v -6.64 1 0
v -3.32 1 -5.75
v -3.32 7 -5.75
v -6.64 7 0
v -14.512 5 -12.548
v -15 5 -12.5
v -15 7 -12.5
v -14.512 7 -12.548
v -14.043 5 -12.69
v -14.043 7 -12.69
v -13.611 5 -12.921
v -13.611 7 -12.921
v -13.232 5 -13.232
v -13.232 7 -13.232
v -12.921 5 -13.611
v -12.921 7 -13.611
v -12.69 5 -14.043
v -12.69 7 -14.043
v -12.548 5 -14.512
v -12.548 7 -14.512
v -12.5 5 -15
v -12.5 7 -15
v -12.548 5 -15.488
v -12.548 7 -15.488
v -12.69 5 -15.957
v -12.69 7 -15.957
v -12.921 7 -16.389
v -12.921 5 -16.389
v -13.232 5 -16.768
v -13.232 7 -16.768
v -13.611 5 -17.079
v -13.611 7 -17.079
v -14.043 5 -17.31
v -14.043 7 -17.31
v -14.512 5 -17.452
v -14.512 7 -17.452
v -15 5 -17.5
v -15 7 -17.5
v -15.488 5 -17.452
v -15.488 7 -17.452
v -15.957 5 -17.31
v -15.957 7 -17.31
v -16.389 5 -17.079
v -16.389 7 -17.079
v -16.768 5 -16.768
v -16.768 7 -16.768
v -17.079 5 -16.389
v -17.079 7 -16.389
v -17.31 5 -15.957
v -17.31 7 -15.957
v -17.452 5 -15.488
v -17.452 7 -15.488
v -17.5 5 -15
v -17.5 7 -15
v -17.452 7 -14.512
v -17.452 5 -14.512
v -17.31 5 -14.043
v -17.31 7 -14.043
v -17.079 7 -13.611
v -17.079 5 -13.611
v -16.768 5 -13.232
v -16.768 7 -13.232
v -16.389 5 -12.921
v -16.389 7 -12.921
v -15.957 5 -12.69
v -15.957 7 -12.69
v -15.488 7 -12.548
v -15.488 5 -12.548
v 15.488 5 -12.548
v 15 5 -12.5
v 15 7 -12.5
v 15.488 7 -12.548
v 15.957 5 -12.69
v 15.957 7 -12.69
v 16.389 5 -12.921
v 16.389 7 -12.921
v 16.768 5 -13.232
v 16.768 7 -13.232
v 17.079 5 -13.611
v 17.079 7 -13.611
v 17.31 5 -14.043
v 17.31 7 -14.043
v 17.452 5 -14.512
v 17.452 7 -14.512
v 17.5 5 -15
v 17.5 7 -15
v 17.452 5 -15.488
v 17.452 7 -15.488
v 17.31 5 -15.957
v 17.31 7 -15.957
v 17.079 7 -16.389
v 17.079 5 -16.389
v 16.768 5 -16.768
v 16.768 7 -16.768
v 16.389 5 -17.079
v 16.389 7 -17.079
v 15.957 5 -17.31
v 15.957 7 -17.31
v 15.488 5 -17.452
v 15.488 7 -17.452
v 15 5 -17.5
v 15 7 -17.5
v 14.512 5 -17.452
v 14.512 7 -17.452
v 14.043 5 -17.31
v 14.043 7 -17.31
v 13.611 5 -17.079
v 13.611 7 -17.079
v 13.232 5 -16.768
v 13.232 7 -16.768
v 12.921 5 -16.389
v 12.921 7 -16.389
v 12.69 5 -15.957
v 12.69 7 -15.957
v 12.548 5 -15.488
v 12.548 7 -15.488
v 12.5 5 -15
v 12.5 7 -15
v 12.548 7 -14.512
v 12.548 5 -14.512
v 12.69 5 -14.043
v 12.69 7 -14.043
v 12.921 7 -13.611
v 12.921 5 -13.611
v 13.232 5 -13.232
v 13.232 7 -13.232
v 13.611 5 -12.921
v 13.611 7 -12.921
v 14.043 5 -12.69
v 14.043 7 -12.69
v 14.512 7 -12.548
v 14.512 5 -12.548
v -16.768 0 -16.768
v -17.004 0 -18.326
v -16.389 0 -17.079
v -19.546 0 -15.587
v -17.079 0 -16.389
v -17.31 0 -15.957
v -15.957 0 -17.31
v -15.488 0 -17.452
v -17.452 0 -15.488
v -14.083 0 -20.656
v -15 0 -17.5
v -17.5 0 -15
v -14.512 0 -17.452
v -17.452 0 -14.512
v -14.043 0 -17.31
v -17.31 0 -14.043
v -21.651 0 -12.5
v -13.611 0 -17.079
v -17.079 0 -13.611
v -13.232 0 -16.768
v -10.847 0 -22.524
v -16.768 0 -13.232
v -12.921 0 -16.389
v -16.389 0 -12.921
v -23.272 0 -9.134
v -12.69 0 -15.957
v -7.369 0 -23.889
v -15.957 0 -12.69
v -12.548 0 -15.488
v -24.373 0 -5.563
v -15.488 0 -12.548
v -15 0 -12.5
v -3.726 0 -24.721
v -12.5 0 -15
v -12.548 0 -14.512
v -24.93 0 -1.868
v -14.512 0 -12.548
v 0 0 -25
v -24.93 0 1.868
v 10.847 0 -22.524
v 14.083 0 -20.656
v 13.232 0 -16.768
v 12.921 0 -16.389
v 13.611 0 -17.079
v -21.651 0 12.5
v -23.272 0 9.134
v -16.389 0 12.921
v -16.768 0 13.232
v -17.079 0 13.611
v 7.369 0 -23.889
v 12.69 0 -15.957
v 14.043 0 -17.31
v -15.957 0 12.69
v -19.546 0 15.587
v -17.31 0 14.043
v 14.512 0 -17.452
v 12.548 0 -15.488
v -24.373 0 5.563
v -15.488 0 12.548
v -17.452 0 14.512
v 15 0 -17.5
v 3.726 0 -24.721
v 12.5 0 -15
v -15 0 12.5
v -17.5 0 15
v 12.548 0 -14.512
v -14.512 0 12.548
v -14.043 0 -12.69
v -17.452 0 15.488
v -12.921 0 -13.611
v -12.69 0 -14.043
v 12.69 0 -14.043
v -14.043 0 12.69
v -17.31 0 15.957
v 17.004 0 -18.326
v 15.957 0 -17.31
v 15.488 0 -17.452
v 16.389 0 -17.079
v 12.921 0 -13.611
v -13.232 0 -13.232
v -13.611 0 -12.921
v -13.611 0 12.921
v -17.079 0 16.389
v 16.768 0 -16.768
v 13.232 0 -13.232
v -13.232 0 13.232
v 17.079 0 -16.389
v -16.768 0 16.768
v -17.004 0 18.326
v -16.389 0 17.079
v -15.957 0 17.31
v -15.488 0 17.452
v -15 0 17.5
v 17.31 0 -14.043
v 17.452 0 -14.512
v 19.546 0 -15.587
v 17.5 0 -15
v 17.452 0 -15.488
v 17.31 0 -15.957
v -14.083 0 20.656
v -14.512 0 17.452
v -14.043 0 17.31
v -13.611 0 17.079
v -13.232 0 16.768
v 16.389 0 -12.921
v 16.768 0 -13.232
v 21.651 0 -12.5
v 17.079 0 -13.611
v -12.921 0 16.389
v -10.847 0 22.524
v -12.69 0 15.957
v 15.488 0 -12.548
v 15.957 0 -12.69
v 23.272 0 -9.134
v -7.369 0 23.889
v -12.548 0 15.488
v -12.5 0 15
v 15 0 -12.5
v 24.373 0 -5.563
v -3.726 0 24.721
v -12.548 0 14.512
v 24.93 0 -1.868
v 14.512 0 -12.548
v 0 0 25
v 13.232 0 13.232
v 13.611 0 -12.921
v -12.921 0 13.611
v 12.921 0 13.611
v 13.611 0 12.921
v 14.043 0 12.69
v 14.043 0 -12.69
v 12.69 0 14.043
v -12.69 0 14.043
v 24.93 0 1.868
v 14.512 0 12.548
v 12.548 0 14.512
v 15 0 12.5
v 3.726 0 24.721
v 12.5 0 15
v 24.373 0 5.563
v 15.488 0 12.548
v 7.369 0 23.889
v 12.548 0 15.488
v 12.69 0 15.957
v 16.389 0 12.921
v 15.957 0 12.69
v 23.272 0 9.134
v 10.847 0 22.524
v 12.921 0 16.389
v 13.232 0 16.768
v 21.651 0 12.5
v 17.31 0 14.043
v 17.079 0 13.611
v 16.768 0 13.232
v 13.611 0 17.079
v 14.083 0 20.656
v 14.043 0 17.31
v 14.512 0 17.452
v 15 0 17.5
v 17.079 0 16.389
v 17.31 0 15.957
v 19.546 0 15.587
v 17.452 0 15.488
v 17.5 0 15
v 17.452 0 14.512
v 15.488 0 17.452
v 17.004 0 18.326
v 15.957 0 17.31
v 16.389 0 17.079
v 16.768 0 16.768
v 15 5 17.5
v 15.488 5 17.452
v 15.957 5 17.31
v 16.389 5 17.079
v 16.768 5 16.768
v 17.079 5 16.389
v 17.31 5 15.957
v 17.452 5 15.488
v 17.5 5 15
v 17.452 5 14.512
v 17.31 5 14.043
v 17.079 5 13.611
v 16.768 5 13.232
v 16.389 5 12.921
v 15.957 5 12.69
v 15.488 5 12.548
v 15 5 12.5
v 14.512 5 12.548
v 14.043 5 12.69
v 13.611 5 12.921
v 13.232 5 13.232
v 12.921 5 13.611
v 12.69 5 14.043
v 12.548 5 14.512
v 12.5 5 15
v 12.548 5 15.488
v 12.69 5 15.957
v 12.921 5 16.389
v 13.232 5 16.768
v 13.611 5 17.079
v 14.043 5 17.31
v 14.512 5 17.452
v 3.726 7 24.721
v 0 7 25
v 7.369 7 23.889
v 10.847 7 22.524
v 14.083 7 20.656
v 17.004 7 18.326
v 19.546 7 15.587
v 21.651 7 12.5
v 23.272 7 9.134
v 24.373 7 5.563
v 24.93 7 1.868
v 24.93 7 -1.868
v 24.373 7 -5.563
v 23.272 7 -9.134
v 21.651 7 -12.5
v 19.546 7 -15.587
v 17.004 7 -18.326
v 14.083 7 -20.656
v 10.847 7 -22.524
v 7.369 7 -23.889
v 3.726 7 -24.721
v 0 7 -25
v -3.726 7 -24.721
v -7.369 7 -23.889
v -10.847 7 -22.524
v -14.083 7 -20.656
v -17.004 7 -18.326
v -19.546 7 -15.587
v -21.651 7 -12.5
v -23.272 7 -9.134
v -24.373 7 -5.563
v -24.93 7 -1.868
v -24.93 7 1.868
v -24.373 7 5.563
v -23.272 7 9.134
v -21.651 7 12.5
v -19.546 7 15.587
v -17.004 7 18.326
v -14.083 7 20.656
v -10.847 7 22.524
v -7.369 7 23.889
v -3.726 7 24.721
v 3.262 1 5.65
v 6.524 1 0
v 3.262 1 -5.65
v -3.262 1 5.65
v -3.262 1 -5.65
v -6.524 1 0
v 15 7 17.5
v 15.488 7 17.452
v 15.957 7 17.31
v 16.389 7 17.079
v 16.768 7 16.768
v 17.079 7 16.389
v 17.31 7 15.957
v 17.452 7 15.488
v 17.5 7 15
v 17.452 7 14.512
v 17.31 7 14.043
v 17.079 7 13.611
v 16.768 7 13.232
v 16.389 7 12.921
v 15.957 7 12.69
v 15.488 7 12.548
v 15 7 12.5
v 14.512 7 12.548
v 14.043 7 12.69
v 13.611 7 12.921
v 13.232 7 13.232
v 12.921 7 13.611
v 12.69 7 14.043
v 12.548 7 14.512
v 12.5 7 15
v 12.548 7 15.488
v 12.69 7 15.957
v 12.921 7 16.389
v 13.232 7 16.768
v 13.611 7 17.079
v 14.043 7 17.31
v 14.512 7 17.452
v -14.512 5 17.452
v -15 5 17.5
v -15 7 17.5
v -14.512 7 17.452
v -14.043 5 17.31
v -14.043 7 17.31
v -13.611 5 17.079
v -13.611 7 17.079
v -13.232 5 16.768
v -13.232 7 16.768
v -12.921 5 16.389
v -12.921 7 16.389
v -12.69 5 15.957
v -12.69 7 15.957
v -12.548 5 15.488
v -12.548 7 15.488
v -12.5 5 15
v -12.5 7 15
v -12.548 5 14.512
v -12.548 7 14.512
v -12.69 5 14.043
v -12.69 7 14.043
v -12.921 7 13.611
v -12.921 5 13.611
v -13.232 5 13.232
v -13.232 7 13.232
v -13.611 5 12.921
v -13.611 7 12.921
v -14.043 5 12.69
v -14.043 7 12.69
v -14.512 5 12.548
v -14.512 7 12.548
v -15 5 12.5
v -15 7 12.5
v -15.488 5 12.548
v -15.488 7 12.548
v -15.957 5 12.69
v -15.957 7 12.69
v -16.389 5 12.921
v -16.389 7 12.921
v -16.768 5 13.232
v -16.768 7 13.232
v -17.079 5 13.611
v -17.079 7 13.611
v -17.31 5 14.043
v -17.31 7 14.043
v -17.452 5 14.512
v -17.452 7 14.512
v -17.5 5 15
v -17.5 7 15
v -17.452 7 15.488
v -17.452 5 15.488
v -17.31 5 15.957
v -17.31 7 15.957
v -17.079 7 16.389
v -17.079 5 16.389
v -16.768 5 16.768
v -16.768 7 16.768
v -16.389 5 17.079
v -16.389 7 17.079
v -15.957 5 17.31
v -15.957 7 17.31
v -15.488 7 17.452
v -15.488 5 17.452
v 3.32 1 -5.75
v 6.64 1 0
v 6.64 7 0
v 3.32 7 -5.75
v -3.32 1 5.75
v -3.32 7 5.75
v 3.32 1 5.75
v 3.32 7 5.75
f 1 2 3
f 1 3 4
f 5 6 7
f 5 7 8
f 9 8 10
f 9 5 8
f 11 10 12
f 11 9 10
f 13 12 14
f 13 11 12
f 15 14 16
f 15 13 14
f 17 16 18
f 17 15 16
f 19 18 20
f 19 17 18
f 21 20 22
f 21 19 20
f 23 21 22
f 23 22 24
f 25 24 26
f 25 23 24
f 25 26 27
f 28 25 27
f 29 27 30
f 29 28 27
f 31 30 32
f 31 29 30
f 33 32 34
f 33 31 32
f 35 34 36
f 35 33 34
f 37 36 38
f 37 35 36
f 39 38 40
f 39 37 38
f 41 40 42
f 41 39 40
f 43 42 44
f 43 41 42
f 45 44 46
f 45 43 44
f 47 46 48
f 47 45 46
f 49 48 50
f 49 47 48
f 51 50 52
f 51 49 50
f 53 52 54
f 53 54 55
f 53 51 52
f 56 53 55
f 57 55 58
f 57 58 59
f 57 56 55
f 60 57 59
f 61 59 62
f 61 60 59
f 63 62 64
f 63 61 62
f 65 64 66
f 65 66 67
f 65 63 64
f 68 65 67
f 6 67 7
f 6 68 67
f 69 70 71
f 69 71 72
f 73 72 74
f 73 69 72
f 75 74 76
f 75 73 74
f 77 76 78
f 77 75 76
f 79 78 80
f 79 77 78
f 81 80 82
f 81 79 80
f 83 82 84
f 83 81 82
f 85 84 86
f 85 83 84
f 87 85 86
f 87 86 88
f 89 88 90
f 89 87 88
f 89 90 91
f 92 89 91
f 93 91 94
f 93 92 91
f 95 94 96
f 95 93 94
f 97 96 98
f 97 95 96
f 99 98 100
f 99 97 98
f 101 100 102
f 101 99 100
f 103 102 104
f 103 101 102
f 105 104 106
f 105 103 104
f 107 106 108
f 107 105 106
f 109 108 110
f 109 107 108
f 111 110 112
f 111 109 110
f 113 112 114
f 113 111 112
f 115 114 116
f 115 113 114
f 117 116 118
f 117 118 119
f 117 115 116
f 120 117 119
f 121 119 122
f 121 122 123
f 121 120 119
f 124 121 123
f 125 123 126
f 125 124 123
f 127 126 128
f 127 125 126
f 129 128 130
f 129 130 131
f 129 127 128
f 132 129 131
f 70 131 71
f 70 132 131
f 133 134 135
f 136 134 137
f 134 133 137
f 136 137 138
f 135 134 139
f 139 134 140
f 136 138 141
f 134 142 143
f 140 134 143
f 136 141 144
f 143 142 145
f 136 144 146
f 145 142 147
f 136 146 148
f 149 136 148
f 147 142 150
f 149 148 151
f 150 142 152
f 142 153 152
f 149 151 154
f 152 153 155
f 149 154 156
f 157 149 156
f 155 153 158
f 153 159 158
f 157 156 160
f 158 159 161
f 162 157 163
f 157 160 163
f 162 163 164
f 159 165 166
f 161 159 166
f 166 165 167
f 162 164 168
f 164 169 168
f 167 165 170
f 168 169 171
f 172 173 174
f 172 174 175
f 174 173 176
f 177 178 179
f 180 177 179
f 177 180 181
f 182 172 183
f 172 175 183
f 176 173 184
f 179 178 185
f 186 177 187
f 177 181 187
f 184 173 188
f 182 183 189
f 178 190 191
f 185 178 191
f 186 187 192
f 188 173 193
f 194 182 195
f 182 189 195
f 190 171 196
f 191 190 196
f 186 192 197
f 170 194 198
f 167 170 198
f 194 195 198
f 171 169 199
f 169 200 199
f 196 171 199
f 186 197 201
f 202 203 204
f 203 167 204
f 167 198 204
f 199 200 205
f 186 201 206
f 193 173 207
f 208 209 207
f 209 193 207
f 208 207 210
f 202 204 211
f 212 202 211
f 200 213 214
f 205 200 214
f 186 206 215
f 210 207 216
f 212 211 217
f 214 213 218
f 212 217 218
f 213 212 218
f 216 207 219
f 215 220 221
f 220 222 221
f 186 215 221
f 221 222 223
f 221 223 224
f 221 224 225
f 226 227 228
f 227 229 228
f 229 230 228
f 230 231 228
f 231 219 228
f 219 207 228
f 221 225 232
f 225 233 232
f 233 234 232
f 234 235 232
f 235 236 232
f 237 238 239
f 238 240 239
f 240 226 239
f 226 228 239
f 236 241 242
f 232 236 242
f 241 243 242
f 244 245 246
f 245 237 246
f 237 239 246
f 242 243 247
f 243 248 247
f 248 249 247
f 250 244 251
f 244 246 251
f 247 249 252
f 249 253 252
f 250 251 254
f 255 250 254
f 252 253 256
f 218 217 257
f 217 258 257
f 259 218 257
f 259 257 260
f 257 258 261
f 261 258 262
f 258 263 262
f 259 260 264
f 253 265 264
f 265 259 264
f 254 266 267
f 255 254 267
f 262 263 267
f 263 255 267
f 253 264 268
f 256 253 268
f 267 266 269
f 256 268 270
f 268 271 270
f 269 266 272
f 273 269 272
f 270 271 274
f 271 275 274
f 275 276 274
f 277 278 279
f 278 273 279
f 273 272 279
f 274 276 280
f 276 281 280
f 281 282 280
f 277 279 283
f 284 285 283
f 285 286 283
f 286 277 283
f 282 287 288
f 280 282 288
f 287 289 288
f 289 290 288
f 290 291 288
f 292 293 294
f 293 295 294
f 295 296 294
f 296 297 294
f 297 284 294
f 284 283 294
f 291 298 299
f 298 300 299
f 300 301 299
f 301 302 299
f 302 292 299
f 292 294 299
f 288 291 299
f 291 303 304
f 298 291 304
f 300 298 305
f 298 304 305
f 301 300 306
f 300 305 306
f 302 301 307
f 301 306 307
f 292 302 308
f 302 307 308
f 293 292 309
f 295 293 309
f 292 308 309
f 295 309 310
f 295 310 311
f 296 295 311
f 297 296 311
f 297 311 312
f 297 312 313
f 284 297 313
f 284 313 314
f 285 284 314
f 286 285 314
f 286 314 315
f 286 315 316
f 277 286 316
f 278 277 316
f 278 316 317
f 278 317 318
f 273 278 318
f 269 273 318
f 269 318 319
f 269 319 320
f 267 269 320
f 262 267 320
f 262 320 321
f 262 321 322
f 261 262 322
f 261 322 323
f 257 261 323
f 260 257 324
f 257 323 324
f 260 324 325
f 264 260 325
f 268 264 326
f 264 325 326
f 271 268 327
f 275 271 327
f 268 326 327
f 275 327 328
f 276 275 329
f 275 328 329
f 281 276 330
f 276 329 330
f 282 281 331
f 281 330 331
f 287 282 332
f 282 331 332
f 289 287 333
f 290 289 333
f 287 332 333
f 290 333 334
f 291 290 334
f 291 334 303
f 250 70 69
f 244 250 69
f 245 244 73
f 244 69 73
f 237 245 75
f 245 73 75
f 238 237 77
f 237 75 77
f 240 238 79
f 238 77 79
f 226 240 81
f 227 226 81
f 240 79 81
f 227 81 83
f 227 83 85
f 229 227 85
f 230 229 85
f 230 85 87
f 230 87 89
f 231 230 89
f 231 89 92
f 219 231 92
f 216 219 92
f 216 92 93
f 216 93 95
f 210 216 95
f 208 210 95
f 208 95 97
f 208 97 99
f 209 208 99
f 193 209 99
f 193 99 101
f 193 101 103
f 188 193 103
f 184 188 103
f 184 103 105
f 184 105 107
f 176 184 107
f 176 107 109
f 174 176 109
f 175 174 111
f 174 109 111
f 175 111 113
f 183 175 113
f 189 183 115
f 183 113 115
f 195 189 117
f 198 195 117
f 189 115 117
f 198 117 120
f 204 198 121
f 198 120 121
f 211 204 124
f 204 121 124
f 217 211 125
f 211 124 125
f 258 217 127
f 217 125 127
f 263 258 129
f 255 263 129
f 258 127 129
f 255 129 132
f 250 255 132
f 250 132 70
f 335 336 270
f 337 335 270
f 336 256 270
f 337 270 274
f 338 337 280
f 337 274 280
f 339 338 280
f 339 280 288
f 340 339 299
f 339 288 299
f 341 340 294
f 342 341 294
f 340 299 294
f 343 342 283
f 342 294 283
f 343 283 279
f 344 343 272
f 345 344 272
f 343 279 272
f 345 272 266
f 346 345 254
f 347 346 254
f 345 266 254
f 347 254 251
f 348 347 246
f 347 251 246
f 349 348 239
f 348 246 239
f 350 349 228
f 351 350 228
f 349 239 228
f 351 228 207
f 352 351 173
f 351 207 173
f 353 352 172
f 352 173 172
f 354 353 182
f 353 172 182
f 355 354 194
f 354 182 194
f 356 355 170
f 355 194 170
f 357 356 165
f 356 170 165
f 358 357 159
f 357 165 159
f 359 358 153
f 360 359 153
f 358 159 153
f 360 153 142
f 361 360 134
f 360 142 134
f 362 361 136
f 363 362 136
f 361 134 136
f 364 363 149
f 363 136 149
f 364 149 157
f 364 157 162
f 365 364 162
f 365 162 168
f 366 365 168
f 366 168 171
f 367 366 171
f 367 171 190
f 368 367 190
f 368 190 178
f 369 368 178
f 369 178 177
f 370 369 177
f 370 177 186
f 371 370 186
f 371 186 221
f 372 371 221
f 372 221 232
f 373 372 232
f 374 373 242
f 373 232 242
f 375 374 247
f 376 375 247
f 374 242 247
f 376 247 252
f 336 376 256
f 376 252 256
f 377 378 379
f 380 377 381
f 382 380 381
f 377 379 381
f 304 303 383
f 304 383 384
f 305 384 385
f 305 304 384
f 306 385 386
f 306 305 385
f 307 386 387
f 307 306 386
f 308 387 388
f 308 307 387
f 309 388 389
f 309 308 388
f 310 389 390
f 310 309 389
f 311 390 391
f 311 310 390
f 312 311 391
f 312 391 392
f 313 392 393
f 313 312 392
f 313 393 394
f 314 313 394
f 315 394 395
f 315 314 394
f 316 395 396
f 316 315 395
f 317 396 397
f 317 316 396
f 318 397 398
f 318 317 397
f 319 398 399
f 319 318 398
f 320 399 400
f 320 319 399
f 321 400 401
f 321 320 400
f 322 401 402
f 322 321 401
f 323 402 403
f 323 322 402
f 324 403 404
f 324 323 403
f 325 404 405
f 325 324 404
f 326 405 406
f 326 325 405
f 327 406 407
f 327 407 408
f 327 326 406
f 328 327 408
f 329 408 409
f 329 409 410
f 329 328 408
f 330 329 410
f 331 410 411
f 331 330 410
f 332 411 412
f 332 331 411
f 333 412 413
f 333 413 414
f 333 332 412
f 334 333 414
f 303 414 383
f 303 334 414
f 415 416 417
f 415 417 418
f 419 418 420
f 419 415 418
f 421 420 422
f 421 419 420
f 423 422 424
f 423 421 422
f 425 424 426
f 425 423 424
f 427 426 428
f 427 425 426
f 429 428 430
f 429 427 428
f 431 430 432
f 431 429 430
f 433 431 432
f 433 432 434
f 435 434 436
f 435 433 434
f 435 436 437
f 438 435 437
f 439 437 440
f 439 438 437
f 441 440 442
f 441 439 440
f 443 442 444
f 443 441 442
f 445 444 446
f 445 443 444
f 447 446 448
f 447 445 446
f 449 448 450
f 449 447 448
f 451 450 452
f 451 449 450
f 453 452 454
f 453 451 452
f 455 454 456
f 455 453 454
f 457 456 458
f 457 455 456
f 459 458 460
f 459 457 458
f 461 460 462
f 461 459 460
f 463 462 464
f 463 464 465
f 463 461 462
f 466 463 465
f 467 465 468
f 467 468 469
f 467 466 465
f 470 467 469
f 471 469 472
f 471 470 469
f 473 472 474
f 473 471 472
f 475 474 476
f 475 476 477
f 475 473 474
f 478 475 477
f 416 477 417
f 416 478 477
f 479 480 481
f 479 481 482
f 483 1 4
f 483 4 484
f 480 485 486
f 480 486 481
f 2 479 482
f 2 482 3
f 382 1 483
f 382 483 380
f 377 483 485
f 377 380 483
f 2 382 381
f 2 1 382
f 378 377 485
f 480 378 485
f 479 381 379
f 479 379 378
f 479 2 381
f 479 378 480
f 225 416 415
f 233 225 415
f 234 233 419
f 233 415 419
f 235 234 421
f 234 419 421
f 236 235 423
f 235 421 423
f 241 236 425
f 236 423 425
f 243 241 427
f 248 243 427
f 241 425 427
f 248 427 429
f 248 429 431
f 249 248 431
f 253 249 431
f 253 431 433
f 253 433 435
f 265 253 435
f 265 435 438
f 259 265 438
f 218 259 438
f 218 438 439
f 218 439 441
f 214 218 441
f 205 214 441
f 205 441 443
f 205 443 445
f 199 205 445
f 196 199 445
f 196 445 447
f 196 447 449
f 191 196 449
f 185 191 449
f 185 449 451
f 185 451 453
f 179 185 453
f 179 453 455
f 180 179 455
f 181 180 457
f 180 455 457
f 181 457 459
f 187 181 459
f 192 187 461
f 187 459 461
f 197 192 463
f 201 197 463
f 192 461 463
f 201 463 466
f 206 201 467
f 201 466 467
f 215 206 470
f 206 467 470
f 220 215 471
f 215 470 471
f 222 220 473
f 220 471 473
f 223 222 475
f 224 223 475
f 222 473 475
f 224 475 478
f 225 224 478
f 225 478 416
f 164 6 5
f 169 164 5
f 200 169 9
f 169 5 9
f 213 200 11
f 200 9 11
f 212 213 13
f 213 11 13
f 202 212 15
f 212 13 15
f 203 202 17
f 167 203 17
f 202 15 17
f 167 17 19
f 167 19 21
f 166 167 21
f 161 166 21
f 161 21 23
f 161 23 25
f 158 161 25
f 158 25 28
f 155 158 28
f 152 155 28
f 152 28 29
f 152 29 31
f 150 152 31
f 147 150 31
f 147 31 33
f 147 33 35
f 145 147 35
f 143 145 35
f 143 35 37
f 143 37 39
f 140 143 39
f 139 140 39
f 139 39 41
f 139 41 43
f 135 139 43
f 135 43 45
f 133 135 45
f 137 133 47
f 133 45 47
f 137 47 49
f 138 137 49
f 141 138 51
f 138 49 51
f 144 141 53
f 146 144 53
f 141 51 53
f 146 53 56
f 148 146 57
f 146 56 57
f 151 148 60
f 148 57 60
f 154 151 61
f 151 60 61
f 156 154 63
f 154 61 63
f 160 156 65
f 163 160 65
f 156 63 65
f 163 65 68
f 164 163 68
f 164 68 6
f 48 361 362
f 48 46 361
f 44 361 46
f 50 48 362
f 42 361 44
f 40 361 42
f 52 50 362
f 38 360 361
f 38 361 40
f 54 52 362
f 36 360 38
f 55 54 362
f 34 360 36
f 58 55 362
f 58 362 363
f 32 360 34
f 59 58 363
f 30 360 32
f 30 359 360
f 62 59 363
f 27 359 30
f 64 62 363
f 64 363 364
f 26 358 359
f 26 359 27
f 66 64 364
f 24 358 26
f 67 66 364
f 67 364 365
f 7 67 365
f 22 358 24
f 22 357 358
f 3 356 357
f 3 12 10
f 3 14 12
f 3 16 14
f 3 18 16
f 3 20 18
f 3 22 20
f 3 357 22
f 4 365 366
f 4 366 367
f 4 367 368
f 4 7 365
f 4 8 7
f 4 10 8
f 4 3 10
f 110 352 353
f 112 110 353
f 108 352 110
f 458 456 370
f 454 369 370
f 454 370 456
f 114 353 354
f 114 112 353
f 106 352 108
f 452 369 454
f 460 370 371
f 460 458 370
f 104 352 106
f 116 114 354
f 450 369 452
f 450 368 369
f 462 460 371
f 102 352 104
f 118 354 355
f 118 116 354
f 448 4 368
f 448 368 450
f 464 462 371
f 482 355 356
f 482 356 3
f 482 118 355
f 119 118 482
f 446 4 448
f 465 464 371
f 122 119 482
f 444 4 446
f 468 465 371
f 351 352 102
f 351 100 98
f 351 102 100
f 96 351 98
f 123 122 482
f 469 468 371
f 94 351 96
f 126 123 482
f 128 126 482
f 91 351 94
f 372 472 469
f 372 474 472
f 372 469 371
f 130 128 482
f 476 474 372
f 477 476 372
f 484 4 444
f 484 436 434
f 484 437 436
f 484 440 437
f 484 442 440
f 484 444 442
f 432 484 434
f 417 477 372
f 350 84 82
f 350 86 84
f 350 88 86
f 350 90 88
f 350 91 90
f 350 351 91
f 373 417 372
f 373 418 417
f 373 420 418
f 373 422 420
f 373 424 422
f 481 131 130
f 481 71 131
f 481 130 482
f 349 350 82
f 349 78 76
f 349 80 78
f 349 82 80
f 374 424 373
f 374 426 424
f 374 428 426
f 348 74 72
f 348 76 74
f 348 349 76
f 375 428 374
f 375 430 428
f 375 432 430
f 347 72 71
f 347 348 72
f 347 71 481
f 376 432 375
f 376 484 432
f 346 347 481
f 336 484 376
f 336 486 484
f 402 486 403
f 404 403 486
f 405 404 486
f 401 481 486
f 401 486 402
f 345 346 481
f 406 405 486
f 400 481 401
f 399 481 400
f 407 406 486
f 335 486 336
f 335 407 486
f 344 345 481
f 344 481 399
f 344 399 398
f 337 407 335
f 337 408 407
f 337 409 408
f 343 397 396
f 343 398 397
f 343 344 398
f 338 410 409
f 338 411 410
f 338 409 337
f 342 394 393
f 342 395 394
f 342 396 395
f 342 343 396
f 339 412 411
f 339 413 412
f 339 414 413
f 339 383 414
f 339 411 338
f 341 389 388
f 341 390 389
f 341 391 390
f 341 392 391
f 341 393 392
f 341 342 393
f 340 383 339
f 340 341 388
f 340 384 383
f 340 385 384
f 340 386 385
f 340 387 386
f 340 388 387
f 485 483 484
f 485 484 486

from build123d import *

# Parameters (mm, degrees)
SKETCH1_R           = 25
BOSS_EXTRUDE1_DEPTH = 5
SKETCH2_R           = 2.5
CUT_EXTRUDE1_DEPTH  = 36.707142143
CUT_EXTRUDE2_DEPTH  = 4
MOVE_FACE1_BY       = 2
MOVE_START          = 1
MOVE_FACE2_DEPTH    = 6


# Read off the part's stored shape, not the designer's step: Move Face2
with BuildPart() as part:
    # Sketch1 → Boss-Extrude1 (new body)
    with BuildSketch(Plane(origin=(0, 0, 0), x_dir=(1, 0, 0), z_dir=(0, 1, 0))):
        with Locations(Location((0, 0, 0), (0, 0, 270))):
            Circle(SKETCH1_R)
    extrude(amount=BOSS_EXTRUDE1_DEPTH)

    # Sketch2 → Cut-Extrude1 (cut, through all)
    with BuildSketch(Plane(origin=(0, 5, 0), x_dir=(1, 0, 0), z_dir=(0, 1, 0))):
        with Locations(Location((-15, 15, 0), (0, 0, 270))):
            Circle(SKETCH2_R)
        with Locations(Location((15, 15, 0), (0, 0, 270))):
            Circle(SKETCH2_R)
        with Locations(Location((15, -15, 0), (0, 0, 270))):
            Circle(SKETCH2_R)
        with Locations(Location((-15, -15, 0), (0, 0, 270))):
            Circle(SKETCH2_R)
    extrude(amount=-CUT_EXTRUDE1_DEPTH, mode=Mode.SUBTRACT)

    # Sketch7 → Cut-Extrude2 (cut)
    with BuildSketch(Plane(origin=(0, 5, 0), x_dir=(1, 0, 0), z_dir=(0, 1, 0))):
        Polygon((3.262029021, -5.65), (-3.262029021, -5.65), (-6.524058042, 0), (-3.262029021, 5.65), (3.262029021, 5.65), (6.524058042, 0), align=None)
    extrude(amount=-CUT_EXTRUDE2_DEPTH, mode=Mode.SUBTRACT)

    # Move Face1: a face moved outward by 2.0
    extrude(part.faces().sort_by_distance((0, 5, 12.5))[0], amount=MOVE_FACE1_BY, dir=(0, 1, 0))

    # Move Face2 outline → Move Face2 (cut)
    with BuildSketch(Plane(origin=(0, 0, 0), x_dir=(1, 0, 0), z_dir=(0, 1, 0)).offset(MOVE_START)):
        Polygon((-3.319764048, 5.75), (-6.639528096, 0), (-3.319764048, -5.75), (3.319764048, -5.75), (6.639528096, 0), (3.319764048, 5.75), align=None)
        Polygon((-3.262029021, -5.65), (-6.524058042, 0), (-3.262029021, 5.65), (3.262029021, 5.65), (6.524058042, 0), (3.262029021, -5.65), align=None, mode=Mode.SUBTRACT)
    extrude(amount=MOVE_FACE2_DEPTH, mode=Mode.SUBTRACT)


solid = part.part
